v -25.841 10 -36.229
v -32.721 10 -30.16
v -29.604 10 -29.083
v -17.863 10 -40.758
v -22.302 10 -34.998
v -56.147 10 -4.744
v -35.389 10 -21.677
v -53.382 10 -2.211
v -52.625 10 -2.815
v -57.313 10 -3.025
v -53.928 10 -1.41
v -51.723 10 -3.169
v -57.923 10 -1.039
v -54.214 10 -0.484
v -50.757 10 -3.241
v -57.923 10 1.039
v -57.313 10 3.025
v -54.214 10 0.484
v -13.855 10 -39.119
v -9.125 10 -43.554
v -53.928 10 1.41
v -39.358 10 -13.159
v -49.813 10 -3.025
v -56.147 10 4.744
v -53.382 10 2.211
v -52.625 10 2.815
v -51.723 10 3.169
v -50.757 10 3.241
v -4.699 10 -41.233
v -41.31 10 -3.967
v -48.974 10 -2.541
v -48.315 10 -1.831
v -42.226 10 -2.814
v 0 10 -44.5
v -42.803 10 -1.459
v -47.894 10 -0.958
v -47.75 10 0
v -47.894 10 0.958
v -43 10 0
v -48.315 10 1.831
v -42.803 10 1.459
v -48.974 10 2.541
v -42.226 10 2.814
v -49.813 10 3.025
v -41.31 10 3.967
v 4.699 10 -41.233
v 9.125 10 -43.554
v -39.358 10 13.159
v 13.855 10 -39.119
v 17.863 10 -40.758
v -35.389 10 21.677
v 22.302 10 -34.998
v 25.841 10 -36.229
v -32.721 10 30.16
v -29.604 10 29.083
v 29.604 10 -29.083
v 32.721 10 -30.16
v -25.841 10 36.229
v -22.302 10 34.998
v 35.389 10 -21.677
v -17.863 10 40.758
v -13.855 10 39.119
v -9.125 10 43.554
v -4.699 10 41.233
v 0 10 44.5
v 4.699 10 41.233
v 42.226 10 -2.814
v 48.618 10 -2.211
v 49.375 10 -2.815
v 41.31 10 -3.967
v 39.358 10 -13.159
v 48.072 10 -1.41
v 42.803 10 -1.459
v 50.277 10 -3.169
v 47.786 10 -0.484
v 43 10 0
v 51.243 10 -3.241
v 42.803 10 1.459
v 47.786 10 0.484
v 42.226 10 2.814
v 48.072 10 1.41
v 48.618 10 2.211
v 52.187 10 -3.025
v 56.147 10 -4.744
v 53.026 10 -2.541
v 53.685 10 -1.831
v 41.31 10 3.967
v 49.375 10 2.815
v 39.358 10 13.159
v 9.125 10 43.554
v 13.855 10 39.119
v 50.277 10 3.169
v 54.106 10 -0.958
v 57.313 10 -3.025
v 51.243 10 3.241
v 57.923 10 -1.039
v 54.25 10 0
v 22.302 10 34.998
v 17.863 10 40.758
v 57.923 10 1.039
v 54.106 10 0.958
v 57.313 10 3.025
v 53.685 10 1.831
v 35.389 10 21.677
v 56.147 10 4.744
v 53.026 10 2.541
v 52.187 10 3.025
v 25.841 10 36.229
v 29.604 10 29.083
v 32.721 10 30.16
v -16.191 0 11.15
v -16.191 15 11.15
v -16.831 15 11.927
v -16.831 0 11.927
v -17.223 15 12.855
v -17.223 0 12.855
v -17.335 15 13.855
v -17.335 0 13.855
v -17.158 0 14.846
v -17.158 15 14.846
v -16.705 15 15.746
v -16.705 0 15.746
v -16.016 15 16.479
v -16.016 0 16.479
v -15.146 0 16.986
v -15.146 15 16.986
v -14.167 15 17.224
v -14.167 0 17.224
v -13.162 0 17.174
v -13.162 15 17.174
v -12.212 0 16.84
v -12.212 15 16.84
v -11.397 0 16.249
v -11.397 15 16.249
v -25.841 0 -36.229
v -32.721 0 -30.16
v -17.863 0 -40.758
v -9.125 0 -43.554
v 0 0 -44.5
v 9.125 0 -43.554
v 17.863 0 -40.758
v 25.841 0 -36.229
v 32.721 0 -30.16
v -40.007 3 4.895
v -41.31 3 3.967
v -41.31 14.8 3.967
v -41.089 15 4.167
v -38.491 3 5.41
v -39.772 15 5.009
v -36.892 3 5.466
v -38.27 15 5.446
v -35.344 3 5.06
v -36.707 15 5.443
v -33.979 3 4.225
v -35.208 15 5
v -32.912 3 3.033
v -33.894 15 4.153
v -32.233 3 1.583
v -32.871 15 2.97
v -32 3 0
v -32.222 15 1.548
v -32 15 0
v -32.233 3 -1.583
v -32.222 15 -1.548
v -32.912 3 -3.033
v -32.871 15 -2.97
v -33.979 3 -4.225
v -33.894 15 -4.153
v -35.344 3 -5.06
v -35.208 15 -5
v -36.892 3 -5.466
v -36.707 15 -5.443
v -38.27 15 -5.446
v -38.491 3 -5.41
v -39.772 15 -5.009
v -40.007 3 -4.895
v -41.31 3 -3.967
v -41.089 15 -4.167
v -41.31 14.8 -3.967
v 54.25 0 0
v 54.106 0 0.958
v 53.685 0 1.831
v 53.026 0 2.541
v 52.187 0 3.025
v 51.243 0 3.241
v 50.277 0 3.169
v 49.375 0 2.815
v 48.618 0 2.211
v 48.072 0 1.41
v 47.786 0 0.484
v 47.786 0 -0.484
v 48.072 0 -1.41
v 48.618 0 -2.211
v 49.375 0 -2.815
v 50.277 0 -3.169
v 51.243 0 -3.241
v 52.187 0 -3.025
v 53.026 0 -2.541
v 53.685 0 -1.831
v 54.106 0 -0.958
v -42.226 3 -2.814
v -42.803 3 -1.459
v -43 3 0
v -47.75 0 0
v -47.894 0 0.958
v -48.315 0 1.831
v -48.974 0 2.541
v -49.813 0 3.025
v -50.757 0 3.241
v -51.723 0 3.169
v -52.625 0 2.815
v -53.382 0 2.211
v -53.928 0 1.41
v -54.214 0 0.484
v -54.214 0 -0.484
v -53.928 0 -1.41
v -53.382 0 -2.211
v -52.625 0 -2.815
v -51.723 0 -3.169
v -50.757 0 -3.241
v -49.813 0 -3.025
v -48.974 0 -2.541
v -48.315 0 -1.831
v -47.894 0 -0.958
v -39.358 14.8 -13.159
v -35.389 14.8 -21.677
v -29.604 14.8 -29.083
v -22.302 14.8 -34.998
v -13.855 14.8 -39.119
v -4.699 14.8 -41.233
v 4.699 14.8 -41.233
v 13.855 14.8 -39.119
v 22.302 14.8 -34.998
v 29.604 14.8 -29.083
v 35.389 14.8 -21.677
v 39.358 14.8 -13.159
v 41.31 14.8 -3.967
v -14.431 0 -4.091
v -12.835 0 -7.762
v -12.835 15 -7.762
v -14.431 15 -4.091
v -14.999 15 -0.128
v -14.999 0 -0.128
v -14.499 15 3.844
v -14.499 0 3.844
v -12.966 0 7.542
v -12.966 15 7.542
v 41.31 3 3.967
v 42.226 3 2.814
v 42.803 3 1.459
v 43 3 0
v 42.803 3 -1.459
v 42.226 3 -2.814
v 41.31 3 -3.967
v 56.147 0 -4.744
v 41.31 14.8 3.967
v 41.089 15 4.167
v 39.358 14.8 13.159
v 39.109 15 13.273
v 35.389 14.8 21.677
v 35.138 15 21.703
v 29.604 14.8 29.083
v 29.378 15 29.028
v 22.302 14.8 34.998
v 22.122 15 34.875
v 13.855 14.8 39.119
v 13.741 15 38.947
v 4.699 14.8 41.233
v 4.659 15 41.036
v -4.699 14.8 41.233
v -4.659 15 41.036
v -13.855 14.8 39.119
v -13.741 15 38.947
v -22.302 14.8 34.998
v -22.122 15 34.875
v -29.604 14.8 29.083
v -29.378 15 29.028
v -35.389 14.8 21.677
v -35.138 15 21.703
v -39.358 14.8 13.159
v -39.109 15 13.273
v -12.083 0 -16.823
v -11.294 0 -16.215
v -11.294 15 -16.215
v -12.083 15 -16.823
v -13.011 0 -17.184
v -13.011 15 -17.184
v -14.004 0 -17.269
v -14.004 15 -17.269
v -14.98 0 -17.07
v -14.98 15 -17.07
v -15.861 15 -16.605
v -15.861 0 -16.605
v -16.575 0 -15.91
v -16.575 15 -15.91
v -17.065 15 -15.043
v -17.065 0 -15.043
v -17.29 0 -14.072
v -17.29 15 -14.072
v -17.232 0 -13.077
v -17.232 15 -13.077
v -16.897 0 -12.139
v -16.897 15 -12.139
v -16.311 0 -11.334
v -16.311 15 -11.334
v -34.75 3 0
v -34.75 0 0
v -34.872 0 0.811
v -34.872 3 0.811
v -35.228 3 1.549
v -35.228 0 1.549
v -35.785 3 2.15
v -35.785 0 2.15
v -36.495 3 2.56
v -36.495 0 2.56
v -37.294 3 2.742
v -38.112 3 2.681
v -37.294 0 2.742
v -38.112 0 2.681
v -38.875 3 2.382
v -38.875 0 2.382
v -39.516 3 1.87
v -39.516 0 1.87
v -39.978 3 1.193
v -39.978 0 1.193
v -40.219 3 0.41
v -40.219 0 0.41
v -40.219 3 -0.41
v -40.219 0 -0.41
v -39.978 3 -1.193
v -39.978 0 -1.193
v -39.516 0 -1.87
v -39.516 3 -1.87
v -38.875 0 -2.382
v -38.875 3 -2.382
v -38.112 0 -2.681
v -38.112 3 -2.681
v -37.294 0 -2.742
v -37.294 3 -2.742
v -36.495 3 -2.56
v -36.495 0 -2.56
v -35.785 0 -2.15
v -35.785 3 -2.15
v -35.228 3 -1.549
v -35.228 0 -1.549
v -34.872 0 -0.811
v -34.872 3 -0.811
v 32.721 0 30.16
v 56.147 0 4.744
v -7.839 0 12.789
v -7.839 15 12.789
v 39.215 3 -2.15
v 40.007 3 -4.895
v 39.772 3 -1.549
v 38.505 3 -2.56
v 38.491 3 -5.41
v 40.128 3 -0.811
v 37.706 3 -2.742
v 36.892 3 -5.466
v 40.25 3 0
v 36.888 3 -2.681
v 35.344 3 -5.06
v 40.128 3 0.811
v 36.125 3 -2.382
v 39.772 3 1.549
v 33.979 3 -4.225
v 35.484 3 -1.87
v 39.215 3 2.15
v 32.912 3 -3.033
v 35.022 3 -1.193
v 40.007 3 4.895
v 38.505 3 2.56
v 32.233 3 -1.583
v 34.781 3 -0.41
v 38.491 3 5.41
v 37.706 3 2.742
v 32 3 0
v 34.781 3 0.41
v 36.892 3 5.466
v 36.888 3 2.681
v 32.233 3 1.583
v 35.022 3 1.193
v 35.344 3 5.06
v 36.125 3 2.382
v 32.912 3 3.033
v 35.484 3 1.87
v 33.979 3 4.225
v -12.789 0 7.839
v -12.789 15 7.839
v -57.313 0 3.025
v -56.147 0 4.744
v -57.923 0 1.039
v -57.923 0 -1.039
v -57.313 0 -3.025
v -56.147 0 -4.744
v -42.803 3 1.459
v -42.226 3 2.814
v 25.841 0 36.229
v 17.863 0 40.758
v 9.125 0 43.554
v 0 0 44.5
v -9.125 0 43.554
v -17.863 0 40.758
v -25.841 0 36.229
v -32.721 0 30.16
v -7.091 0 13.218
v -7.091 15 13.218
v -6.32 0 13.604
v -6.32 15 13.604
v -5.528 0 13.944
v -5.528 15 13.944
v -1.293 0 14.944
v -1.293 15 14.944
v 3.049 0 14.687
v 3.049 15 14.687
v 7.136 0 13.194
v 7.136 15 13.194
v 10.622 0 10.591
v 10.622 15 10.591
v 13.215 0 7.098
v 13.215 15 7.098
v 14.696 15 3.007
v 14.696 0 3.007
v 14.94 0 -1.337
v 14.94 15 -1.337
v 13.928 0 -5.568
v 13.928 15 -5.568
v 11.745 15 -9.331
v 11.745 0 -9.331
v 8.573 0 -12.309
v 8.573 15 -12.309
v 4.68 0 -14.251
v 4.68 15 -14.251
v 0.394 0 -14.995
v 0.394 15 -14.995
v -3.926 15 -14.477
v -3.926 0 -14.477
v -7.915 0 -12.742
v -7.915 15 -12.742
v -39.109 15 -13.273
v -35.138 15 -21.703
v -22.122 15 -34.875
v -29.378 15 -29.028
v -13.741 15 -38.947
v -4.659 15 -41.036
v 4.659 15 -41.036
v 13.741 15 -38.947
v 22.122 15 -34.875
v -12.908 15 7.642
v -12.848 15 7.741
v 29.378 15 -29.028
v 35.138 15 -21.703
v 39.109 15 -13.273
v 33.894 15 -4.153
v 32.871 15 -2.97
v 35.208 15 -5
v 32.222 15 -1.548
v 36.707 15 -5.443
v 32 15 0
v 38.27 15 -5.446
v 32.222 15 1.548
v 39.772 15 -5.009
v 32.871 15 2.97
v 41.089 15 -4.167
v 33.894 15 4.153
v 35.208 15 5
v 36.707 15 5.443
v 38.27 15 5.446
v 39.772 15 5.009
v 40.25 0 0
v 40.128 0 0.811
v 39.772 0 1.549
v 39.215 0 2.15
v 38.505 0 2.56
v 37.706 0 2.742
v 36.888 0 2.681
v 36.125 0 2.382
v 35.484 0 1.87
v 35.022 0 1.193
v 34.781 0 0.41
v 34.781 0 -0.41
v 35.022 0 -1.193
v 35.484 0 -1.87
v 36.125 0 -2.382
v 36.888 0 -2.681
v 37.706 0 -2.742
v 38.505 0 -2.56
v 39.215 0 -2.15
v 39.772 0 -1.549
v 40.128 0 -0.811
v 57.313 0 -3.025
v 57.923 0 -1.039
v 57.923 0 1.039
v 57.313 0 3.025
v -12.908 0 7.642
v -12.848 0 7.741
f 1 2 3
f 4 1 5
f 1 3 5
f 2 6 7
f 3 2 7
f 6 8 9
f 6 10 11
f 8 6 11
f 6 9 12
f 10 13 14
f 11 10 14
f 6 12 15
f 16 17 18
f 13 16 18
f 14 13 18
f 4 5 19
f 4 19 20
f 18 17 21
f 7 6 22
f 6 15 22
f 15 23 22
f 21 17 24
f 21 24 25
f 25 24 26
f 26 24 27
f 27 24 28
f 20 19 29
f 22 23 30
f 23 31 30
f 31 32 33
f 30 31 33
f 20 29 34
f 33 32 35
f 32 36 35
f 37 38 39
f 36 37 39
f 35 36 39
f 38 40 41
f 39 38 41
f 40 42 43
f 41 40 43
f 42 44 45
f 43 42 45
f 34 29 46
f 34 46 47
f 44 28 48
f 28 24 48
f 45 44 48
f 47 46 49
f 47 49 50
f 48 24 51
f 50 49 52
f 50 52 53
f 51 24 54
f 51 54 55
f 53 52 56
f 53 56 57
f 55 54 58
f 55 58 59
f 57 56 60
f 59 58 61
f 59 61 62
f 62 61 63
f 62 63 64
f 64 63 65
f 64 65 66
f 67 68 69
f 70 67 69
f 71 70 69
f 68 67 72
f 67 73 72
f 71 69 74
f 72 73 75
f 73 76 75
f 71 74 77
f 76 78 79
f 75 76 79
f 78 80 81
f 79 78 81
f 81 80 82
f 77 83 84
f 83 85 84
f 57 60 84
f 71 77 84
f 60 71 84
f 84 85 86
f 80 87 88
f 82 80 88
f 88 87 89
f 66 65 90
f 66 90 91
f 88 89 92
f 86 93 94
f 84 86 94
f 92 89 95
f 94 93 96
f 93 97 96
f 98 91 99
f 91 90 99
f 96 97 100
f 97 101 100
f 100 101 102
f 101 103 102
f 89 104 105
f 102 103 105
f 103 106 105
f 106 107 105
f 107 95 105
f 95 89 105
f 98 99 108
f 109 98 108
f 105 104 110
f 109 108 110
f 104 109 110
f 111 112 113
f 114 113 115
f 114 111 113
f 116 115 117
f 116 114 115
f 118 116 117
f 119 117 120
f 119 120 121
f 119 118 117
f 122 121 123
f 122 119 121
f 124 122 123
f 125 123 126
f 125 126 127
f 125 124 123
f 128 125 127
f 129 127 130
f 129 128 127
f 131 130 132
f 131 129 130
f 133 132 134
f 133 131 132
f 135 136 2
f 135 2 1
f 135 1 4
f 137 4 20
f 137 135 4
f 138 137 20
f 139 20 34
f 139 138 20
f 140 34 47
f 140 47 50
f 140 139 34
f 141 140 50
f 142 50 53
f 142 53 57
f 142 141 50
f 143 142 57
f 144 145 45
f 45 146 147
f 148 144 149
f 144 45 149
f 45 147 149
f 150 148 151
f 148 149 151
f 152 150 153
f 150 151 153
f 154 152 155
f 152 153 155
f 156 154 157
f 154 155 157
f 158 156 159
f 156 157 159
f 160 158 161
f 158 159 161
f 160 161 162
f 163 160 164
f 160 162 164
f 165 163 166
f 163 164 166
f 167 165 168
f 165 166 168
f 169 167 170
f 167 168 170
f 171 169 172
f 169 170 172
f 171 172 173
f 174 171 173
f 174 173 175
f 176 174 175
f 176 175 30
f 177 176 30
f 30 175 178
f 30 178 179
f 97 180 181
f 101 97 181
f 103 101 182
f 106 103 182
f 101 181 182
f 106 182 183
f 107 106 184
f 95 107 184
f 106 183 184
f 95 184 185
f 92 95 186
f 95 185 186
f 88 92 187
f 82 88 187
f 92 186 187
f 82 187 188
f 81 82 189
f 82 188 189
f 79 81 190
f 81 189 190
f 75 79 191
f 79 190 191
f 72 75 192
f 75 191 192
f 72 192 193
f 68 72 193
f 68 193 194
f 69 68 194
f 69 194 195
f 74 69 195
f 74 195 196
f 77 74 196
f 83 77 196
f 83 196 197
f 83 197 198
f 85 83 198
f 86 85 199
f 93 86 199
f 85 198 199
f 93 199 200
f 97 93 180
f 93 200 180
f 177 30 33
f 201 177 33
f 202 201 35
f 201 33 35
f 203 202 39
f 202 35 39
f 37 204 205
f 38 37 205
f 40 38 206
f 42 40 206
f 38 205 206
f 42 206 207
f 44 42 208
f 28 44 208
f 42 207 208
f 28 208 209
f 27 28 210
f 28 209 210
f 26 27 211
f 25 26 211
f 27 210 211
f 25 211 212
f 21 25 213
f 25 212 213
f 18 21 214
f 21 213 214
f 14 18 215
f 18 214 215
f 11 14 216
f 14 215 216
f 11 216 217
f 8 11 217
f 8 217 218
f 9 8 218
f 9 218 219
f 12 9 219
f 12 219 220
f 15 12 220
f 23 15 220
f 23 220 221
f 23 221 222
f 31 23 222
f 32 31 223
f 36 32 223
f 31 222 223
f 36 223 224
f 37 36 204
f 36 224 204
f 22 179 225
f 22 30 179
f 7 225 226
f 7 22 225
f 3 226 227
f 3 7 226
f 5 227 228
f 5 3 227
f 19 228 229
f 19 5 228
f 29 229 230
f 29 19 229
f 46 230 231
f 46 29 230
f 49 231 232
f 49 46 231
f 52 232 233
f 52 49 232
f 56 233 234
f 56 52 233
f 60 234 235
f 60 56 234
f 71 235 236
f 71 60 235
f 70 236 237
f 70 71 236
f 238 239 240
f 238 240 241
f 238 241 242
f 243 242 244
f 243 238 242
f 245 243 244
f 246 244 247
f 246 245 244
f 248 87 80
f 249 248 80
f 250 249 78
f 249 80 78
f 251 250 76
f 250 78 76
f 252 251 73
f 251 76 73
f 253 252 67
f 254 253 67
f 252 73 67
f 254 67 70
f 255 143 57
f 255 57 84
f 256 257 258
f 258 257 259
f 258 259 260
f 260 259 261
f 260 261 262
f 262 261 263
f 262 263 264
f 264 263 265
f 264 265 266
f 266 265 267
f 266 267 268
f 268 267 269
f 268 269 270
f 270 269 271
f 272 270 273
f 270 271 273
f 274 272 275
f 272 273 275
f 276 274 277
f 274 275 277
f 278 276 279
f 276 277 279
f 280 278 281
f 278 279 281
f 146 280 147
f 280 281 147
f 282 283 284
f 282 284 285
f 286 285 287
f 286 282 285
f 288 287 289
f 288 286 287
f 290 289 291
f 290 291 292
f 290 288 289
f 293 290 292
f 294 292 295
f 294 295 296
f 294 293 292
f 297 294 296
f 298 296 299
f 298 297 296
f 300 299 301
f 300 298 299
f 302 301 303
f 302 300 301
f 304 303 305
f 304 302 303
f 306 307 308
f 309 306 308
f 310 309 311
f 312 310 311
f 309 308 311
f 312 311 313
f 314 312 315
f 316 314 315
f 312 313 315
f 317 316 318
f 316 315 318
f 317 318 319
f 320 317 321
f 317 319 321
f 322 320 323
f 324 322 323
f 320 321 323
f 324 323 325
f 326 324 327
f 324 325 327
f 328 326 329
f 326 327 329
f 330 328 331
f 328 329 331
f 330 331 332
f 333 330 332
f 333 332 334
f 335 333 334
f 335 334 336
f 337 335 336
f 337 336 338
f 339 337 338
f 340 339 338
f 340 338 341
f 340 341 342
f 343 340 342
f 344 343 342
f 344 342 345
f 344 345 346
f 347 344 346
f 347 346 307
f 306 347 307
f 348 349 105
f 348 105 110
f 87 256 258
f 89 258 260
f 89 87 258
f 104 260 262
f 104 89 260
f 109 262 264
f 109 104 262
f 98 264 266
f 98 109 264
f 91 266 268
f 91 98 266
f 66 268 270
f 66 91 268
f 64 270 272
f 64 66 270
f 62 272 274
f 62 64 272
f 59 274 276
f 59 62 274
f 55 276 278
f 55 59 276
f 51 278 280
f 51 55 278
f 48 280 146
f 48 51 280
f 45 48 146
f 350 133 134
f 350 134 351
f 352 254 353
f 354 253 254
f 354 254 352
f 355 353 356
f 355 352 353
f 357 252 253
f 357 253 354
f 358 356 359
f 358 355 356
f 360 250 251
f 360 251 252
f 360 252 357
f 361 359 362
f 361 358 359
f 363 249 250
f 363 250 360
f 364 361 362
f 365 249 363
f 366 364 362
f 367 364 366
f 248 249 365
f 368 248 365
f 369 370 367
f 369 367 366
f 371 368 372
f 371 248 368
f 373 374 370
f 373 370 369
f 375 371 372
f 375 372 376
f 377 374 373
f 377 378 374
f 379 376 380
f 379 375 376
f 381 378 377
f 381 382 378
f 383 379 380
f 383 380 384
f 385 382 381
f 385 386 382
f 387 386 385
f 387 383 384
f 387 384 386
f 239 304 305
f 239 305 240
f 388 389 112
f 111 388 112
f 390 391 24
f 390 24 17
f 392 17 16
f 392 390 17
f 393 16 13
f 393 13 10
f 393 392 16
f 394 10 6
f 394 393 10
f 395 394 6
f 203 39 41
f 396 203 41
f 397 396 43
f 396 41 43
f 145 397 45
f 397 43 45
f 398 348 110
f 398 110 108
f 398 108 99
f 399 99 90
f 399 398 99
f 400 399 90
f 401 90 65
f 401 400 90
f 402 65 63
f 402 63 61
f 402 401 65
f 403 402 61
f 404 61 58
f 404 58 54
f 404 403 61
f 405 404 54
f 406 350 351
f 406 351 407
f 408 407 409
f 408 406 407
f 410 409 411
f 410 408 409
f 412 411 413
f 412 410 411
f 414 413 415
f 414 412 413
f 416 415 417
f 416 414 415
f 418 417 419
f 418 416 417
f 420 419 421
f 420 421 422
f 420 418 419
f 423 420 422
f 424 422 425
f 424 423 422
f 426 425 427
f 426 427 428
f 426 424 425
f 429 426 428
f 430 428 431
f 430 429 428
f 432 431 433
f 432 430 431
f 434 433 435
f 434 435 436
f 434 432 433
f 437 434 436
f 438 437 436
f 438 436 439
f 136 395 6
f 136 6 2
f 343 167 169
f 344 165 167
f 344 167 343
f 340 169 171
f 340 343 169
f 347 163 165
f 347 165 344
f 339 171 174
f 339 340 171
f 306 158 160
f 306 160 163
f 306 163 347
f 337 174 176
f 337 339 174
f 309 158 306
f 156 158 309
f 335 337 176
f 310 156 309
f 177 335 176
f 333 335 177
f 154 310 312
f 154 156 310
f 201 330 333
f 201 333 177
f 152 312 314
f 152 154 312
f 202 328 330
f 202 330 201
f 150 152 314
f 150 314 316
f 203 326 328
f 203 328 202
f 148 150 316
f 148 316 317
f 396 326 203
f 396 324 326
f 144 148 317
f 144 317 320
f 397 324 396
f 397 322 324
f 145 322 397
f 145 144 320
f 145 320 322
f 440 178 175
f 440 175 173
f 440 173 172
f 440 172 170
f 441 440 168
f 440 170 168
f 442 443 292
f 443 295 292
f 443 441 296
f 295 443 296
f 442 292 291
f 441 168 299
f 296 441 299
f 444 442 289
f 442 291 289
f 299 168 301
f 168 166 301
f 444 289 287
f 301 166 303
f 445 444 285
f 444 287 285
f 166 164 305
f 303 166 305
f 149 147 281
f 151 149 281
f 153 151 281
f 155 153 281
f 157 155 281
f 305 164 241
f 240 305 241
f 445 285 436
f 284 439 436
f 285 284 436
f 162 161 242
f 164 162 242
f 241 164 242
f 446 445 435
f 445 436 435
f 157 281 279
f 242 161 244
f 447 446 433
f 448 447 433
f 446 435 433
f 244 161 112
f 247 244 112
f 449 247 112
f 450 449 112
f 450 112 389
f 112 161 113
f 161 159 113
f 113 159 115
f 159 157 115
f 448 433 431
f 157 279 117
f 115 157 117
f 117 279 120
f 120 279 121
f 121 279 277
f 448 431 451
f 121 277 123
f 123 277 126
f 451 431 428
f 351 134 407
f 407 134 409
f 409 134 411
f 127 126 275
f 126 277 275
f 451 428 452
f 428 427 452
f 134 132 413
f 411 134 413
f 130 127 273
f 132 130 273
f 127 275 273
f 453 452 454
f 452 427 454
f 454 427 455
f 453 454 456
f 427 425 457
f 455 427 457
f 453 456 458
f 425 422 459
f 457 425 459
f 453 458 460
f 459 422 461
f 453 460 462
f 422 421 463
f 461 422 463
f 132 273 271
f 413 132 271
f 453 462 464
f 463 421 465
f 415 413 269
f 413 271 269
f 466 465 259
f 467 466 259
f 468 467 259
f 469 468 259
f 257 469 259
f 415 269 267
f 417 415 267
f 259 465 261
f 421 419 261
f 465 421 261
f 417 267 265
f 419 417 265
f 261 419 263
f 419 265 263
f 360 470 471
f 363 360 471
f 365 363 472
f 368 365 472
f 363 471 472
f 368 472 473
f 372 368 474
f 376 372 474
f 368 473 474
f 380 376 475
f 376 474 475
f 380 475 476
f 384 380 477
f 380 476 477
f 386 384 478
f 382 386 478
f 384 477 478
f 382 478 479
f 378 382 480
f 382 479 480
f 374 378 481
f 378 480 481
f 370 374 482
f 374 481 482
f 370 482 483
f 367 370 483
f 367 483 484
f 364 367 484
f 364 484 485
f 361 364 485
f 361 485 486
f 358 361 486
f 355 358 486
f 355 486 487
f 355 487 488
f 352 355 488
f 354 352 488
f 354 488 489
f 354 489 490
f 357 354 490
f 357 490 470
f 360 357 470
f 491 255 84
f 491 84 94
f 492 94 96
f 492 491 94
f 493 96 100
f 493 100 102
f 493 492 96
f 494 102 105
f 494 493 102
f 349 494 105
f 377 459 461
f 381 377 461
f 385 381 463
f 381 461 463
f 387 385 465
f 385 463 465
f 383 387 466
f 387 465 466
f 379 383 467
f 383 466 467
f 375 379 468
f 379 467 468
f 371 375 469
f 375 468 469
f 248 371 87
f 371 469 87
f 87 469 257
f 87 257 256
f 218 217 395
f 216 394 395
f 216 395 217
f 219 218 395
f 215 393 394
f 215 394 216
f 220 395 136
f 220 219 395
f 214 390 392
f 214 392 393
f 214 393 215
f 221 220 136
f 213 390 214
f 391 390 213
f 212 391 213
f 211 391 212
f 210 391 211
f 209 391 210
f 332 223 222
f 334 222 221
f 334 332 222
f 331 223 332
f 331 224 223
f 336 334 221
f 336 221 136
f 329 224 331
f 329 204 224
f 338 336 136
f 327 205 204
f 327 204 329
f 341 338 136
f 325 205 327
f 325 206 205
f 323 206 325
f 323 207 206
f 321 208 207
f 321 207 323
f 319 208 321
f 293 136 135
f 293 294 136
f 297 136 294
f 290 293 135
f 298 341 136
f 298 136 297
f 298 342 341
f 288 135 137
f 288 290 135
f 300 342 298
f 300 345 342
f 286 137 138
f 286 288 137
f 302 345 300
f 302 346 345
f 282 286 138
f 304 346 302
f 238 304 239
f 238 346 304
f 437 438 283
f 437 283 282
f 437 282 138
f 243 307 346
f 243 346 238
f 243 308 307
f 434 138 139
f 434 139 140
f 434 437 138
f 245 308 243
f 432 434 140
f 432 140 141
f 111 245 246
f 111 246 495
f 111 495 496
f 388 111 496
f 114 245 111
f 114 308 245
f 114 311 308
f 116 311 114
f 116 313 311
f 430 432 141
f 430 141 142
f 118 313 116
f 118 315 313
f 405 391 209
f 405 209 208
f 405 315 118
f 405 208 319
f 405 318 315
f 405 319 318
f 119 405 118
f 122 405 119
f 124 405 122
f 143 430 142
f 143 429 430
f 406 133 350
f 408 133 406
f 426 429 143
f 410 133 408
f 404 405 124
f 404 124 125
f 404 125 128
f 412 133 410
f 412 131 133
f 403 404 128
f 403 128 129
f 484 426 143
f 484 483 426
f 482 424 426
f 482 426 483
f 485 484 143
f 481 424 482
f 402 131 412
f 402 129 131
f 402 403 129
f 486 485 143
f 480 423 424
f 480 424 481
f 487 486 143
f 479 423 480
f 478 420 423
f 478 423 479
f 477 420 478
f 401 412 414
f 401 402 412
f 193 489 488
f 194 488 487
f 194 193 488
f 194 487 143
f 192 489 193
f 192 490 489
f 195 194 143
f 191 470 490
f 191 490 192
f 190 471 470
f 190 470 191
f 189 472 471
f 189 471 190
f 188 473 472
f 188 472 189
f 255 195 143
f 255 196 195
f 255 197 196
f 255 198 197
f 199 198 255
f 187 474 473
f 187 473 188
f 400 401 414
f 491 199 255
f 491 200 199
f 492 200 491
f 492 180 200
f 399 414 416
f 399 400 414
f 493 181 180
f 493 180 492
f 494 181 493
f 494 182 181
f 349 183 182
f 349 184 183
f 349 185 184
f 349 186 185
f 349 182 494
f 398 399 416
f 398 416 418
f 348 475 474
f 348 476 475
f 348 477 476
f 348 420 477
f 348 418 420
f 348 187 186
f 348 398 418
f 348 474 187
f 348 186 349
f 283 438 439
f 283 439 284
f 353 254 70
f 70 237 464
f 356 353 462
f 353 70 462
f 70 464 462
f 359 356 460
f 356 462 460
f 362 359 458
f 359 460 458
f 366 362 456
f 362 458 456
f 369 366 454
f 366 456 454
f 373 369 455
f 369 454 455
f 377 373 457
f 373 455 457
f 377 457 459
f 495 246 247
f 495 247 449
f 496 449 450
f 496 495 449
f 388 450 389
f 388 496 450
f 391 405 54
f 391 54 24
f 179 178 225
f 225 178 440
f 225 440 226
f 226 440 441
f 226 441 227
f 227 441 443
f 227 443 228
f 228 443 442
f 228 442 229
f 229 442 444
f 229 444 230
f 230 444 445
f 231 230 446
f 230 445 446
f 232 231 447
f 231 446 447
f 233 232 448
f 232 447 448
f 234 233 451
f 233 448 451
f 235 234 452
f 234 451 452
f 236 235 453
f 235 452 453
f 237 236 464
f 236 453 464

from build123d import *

# Parameters (mm, degrees)
F0_R        = 3.25
F0_R_2      = 41.5
F0_R_3      = 2.75
F1_DEPTH    = 10
F2_DEPTH    = 15
F3_R        = 2.75
F4_DEPTH    = 12
F5_T2_ANGLE = 170.4527374882
F5_T4_ANGLE = 170.4527374882


# Not quite as in the source:
# - a fillet or chamfer that OpenCascade refuses, or shapes differently, is made with other operations: its cross-section is extruded or revolved along the edge and cut away or added


with BuildPart() as f1:
    # F0 (on Front) → F1 (new body)
    with BuildSketch(Plane.XZ):
        with BuildLine():
            Line((56.1470588235, 4.7442370796), (32.7205882353, 30.159792863))
            ThreePointArc((32.7205882353, 30.159792863), (0, 44.5), (-32.7205882353, 30.159792863))
            Line((-32.7205882353, 30.159792863), (-56.1470588235, 4.7442370796))
            ThreePointArc((-56.1470588235, 4.7442370796), (-58, 0), (-56.1470588235, -4.7442370796))
            Line((-56.1470588235, -4.7442370796), (-32.7205882353, -30.159792863))
            ThreePointArc((-32.7205882353, -30.159792863), (0, -44.5), (32.7205882353, -30.159792863))
            Line((32.7205882353, -30.159792863), (56.1470588235, -4.7442370796))
            ThreePointArc((56.1470588235, -4.7442370796), (58, 0), (56.1470588235, 4.7442370796))
        make_face()
        with Locations((-51, 0)):
            Circle(F0_R, mode=Mode.SUBTRACT)
        Circle(F0_R_2, mode=Mode.SUBTRACT)
        with Locations((51, 0)):
            Circle(F0_R, mode=Mode.SUBTRACT)
        Circle(F0_R_2)
        with BuildLine():
            ThreePointArc((-5.5275883623, 13.9443811945), (14.9403084329, -1.336855987), (-7.9154361587, -12.7415018902))
            Line((-7.9154361587, -12.7415018902), (-11.2935258895, -16.2148281895))
            ThreePointArc((-11.2935258895, -16.2148281895), (-16.2431437728, -16.28328537), (-16.3109133443, -11.3336580242))
            Line((-16.3109133443, -11.3336580242), (-12.8354378119, -7.7621863014))
            ThreePointArc((-12.8354378119, -7.7621863014), (-14.9994558699, -0.1277638746), (-12.9658008757, 7.5424139141))
            ThreePointArc((-12.9658008757, 7.5424139141), (-12.8781036996, 7.6911926971), (-12.7886994065, 7.8389519382))
            Line((-12.7886994065, 7.8389519382), (-16.1911722961, 11.1499710909))
            ThreePointArc((-16.1911722961, 11.1499710909), (-16.3869084591, 16.1374875976), (-11.3967981993, 16.2489916113))
            Line((-11.3967981993, 16.2489916113), (-7.8389519382, 12.7886994065))
            ThreePointArc((-7.8389519382, 12.7886994065), (-6.7082039325, 13.416407865), (-5.5275883623, 13.9443811945))
        make_face(mode=Mode.SUBTRACT)
        with Locations((-37.5, 0)):
            Circle(F0_R_3, mode=Mode.SUBTRACT)
        with Locations((37.5, 0)):
            Circle(F0_R_3, mode=Mode.SUBTRACT)
    extrude(amount=-F1_DEPTH)

    # F0 (on Front) → F2 (join)
    with BuildSketch(Plane.XZ):
        Circle(F0_R_2)
        with BuildLine():
            ThreePointArc((-5.5275883623, 13.9443811945), (14.9403084329, -1.336855987), (-7.9154361587, -12.7415018902))
            Line((-7.9154361587, -12.7415018902), (-11.2935258895, -16.2148281895))
            ThreePointArc((-11.2935258895, -16.2148281895), (-16.2431437728, -16.28328537), (-16.3109133443, -11.3336580242))
            Line((-16.3109133443, -11.3336580242), (-12.8354378119, -7.7621863014))
            ThreePointArc((-12.8354378119, -7.7621863014), (-14.9994558699, -0.1277638746), (-12.9658008757, 7.5424139141))
            ThreePointArc((-12.9658008757, 7.5424139141), (-12.8781036996, 7.6911926971), (-12.7886994065, 7.8389519382))
            Line((-12.7886994065, 7.8389519382), (-16.1911722961, 11.1499710909))
            ThreePointArc((-16.1911722961, 11.1499710909), (-16.3869084591, 16.1374875976), (-11.3967981993, 16.2489916113))
            Line((-11.3967981993, 16.2489916113), (-7.8389519382, 12.7886994065))
            ThreePointArc((-7.8389519382, 12.7886994065), (-6.7082039325, 13.416407865), (-5.5275883623, 13.9443811945))
        make_face(mode=Mode.SUBTRACT)
        with Locations((-37.5, 0)):
            Circle(F0_R_3, mode=Mode.SUBTRACT)
        with Locations((37.5, 0)):
            Circle(F0_R_3, mode=Mode.SUBTRACT)
    extrude(amount=-F2_DEPTH)

    # F3 (on face) → F4 (cut)
    with BuildSketch(Plane(origin=(0, 15, 0), x_dir=(-1, 0, 0), z_dir=(0, 1, 0))):
        with BuildLine():
            ThreePointArc((41.31, -3.9665980386), (42.5598913032, -2.1558061137), (43, 0))
            ThreePointArc((43, 0), (42.5598913032, 2.1558061137), (41.31, 3.9665980386))
            ThreePointArc((41.31, 3.9665980386), (41.4524727851, 1.9855729652), (41.5, 0))
            ThreePointArc((41.5, 0), (41.4524727851, -1.9855729652), (41.31, -3.9665980386))
        make_face()
        with BuildLine():
            ThreePointArc((41.5, 0), (41.4524727851, 1.9855729652), (41.31, 3.9665980386))
            ThreePointArc((41.31, 3.9665980386), (32, 0), (41.31, -3.9665980386))
            ThreePointArc((41.31, -3.9665980386), (41.4524727851, -1.9855729652), (41.5, 0))
        make_face()
        with Locations((37.5, 0)):
            Circle(F3_R, mode=Mode.SUBTRACT)
        with BuildLine():
            ThreePointArc((-41.31, -3.9665980386), (-41.5, 0), (-41.31, 3.9665980386))
            ThreePointArc((-41.31, 3.9665980386), (-43, 0), (-41.31, -3.9665980386))
        make_face()
        with BuildLine():
            ThreePointArc((-32, 0), (-35.3441938863, 5.0598913032), (-41.31, 3.9665980386))
            ThreePointArc((-41.31, 3.9665980386), (-41.5, 0), (-41.31, -3.9665980386))
            ThreePointArc((-41.31, -3.9665980386), (-35.3441938863, -5.0598913032), (-32, 0))
        make_face()
        with Locations((-37.5, 0)):
            Circle(F3_R, mode=Mode.SUBTRACT)
        with Locations((37.5, 0)):
            Circle(F3_R)
        with Locations((-37.5, 0)):
            Circle(F3_R)
    extrude(amount=-F4_DEPTH, mode=Mode.SUBTRACT)

    # F5: chamfer of 0.2 on 2 edges, made by hand

    # F5_s1 → F5_t2 (revolve, cut)
    with BuildSketch(Plane(origin=(0, 0, 0), x_dir=(0, 1, 0), z_dir=(0.0832192271, 0, -0.9965312641))):
        Polygon((14.8, 41.5), (15, 41.3), (15, 41.5), align=None)
    revolve(axis=Axis((0, 15, 0), (0, -1, 0)), revolution_arc=F5_T2_ANGLE, mode=Mode.SUBTRACT)

    # F5_s3 → F5_t4 (revolve, cut)
    with BuildSketch(Plane(origin=(0, 0, 0), x_dir=(0, 1, 0), z_dir=(-0.0832192271, 0, 0.9965312641))):
        Polygon((14.8, 41.5), (15, 41.3), (15, 41.5), align=None)
    revolve(axis=Axis((0, 15, 0), (0, -1, 0)), revolution_arc=F5_T4_ANGLE, mode=Mode.SUBTRACT)


solid = f1.part
